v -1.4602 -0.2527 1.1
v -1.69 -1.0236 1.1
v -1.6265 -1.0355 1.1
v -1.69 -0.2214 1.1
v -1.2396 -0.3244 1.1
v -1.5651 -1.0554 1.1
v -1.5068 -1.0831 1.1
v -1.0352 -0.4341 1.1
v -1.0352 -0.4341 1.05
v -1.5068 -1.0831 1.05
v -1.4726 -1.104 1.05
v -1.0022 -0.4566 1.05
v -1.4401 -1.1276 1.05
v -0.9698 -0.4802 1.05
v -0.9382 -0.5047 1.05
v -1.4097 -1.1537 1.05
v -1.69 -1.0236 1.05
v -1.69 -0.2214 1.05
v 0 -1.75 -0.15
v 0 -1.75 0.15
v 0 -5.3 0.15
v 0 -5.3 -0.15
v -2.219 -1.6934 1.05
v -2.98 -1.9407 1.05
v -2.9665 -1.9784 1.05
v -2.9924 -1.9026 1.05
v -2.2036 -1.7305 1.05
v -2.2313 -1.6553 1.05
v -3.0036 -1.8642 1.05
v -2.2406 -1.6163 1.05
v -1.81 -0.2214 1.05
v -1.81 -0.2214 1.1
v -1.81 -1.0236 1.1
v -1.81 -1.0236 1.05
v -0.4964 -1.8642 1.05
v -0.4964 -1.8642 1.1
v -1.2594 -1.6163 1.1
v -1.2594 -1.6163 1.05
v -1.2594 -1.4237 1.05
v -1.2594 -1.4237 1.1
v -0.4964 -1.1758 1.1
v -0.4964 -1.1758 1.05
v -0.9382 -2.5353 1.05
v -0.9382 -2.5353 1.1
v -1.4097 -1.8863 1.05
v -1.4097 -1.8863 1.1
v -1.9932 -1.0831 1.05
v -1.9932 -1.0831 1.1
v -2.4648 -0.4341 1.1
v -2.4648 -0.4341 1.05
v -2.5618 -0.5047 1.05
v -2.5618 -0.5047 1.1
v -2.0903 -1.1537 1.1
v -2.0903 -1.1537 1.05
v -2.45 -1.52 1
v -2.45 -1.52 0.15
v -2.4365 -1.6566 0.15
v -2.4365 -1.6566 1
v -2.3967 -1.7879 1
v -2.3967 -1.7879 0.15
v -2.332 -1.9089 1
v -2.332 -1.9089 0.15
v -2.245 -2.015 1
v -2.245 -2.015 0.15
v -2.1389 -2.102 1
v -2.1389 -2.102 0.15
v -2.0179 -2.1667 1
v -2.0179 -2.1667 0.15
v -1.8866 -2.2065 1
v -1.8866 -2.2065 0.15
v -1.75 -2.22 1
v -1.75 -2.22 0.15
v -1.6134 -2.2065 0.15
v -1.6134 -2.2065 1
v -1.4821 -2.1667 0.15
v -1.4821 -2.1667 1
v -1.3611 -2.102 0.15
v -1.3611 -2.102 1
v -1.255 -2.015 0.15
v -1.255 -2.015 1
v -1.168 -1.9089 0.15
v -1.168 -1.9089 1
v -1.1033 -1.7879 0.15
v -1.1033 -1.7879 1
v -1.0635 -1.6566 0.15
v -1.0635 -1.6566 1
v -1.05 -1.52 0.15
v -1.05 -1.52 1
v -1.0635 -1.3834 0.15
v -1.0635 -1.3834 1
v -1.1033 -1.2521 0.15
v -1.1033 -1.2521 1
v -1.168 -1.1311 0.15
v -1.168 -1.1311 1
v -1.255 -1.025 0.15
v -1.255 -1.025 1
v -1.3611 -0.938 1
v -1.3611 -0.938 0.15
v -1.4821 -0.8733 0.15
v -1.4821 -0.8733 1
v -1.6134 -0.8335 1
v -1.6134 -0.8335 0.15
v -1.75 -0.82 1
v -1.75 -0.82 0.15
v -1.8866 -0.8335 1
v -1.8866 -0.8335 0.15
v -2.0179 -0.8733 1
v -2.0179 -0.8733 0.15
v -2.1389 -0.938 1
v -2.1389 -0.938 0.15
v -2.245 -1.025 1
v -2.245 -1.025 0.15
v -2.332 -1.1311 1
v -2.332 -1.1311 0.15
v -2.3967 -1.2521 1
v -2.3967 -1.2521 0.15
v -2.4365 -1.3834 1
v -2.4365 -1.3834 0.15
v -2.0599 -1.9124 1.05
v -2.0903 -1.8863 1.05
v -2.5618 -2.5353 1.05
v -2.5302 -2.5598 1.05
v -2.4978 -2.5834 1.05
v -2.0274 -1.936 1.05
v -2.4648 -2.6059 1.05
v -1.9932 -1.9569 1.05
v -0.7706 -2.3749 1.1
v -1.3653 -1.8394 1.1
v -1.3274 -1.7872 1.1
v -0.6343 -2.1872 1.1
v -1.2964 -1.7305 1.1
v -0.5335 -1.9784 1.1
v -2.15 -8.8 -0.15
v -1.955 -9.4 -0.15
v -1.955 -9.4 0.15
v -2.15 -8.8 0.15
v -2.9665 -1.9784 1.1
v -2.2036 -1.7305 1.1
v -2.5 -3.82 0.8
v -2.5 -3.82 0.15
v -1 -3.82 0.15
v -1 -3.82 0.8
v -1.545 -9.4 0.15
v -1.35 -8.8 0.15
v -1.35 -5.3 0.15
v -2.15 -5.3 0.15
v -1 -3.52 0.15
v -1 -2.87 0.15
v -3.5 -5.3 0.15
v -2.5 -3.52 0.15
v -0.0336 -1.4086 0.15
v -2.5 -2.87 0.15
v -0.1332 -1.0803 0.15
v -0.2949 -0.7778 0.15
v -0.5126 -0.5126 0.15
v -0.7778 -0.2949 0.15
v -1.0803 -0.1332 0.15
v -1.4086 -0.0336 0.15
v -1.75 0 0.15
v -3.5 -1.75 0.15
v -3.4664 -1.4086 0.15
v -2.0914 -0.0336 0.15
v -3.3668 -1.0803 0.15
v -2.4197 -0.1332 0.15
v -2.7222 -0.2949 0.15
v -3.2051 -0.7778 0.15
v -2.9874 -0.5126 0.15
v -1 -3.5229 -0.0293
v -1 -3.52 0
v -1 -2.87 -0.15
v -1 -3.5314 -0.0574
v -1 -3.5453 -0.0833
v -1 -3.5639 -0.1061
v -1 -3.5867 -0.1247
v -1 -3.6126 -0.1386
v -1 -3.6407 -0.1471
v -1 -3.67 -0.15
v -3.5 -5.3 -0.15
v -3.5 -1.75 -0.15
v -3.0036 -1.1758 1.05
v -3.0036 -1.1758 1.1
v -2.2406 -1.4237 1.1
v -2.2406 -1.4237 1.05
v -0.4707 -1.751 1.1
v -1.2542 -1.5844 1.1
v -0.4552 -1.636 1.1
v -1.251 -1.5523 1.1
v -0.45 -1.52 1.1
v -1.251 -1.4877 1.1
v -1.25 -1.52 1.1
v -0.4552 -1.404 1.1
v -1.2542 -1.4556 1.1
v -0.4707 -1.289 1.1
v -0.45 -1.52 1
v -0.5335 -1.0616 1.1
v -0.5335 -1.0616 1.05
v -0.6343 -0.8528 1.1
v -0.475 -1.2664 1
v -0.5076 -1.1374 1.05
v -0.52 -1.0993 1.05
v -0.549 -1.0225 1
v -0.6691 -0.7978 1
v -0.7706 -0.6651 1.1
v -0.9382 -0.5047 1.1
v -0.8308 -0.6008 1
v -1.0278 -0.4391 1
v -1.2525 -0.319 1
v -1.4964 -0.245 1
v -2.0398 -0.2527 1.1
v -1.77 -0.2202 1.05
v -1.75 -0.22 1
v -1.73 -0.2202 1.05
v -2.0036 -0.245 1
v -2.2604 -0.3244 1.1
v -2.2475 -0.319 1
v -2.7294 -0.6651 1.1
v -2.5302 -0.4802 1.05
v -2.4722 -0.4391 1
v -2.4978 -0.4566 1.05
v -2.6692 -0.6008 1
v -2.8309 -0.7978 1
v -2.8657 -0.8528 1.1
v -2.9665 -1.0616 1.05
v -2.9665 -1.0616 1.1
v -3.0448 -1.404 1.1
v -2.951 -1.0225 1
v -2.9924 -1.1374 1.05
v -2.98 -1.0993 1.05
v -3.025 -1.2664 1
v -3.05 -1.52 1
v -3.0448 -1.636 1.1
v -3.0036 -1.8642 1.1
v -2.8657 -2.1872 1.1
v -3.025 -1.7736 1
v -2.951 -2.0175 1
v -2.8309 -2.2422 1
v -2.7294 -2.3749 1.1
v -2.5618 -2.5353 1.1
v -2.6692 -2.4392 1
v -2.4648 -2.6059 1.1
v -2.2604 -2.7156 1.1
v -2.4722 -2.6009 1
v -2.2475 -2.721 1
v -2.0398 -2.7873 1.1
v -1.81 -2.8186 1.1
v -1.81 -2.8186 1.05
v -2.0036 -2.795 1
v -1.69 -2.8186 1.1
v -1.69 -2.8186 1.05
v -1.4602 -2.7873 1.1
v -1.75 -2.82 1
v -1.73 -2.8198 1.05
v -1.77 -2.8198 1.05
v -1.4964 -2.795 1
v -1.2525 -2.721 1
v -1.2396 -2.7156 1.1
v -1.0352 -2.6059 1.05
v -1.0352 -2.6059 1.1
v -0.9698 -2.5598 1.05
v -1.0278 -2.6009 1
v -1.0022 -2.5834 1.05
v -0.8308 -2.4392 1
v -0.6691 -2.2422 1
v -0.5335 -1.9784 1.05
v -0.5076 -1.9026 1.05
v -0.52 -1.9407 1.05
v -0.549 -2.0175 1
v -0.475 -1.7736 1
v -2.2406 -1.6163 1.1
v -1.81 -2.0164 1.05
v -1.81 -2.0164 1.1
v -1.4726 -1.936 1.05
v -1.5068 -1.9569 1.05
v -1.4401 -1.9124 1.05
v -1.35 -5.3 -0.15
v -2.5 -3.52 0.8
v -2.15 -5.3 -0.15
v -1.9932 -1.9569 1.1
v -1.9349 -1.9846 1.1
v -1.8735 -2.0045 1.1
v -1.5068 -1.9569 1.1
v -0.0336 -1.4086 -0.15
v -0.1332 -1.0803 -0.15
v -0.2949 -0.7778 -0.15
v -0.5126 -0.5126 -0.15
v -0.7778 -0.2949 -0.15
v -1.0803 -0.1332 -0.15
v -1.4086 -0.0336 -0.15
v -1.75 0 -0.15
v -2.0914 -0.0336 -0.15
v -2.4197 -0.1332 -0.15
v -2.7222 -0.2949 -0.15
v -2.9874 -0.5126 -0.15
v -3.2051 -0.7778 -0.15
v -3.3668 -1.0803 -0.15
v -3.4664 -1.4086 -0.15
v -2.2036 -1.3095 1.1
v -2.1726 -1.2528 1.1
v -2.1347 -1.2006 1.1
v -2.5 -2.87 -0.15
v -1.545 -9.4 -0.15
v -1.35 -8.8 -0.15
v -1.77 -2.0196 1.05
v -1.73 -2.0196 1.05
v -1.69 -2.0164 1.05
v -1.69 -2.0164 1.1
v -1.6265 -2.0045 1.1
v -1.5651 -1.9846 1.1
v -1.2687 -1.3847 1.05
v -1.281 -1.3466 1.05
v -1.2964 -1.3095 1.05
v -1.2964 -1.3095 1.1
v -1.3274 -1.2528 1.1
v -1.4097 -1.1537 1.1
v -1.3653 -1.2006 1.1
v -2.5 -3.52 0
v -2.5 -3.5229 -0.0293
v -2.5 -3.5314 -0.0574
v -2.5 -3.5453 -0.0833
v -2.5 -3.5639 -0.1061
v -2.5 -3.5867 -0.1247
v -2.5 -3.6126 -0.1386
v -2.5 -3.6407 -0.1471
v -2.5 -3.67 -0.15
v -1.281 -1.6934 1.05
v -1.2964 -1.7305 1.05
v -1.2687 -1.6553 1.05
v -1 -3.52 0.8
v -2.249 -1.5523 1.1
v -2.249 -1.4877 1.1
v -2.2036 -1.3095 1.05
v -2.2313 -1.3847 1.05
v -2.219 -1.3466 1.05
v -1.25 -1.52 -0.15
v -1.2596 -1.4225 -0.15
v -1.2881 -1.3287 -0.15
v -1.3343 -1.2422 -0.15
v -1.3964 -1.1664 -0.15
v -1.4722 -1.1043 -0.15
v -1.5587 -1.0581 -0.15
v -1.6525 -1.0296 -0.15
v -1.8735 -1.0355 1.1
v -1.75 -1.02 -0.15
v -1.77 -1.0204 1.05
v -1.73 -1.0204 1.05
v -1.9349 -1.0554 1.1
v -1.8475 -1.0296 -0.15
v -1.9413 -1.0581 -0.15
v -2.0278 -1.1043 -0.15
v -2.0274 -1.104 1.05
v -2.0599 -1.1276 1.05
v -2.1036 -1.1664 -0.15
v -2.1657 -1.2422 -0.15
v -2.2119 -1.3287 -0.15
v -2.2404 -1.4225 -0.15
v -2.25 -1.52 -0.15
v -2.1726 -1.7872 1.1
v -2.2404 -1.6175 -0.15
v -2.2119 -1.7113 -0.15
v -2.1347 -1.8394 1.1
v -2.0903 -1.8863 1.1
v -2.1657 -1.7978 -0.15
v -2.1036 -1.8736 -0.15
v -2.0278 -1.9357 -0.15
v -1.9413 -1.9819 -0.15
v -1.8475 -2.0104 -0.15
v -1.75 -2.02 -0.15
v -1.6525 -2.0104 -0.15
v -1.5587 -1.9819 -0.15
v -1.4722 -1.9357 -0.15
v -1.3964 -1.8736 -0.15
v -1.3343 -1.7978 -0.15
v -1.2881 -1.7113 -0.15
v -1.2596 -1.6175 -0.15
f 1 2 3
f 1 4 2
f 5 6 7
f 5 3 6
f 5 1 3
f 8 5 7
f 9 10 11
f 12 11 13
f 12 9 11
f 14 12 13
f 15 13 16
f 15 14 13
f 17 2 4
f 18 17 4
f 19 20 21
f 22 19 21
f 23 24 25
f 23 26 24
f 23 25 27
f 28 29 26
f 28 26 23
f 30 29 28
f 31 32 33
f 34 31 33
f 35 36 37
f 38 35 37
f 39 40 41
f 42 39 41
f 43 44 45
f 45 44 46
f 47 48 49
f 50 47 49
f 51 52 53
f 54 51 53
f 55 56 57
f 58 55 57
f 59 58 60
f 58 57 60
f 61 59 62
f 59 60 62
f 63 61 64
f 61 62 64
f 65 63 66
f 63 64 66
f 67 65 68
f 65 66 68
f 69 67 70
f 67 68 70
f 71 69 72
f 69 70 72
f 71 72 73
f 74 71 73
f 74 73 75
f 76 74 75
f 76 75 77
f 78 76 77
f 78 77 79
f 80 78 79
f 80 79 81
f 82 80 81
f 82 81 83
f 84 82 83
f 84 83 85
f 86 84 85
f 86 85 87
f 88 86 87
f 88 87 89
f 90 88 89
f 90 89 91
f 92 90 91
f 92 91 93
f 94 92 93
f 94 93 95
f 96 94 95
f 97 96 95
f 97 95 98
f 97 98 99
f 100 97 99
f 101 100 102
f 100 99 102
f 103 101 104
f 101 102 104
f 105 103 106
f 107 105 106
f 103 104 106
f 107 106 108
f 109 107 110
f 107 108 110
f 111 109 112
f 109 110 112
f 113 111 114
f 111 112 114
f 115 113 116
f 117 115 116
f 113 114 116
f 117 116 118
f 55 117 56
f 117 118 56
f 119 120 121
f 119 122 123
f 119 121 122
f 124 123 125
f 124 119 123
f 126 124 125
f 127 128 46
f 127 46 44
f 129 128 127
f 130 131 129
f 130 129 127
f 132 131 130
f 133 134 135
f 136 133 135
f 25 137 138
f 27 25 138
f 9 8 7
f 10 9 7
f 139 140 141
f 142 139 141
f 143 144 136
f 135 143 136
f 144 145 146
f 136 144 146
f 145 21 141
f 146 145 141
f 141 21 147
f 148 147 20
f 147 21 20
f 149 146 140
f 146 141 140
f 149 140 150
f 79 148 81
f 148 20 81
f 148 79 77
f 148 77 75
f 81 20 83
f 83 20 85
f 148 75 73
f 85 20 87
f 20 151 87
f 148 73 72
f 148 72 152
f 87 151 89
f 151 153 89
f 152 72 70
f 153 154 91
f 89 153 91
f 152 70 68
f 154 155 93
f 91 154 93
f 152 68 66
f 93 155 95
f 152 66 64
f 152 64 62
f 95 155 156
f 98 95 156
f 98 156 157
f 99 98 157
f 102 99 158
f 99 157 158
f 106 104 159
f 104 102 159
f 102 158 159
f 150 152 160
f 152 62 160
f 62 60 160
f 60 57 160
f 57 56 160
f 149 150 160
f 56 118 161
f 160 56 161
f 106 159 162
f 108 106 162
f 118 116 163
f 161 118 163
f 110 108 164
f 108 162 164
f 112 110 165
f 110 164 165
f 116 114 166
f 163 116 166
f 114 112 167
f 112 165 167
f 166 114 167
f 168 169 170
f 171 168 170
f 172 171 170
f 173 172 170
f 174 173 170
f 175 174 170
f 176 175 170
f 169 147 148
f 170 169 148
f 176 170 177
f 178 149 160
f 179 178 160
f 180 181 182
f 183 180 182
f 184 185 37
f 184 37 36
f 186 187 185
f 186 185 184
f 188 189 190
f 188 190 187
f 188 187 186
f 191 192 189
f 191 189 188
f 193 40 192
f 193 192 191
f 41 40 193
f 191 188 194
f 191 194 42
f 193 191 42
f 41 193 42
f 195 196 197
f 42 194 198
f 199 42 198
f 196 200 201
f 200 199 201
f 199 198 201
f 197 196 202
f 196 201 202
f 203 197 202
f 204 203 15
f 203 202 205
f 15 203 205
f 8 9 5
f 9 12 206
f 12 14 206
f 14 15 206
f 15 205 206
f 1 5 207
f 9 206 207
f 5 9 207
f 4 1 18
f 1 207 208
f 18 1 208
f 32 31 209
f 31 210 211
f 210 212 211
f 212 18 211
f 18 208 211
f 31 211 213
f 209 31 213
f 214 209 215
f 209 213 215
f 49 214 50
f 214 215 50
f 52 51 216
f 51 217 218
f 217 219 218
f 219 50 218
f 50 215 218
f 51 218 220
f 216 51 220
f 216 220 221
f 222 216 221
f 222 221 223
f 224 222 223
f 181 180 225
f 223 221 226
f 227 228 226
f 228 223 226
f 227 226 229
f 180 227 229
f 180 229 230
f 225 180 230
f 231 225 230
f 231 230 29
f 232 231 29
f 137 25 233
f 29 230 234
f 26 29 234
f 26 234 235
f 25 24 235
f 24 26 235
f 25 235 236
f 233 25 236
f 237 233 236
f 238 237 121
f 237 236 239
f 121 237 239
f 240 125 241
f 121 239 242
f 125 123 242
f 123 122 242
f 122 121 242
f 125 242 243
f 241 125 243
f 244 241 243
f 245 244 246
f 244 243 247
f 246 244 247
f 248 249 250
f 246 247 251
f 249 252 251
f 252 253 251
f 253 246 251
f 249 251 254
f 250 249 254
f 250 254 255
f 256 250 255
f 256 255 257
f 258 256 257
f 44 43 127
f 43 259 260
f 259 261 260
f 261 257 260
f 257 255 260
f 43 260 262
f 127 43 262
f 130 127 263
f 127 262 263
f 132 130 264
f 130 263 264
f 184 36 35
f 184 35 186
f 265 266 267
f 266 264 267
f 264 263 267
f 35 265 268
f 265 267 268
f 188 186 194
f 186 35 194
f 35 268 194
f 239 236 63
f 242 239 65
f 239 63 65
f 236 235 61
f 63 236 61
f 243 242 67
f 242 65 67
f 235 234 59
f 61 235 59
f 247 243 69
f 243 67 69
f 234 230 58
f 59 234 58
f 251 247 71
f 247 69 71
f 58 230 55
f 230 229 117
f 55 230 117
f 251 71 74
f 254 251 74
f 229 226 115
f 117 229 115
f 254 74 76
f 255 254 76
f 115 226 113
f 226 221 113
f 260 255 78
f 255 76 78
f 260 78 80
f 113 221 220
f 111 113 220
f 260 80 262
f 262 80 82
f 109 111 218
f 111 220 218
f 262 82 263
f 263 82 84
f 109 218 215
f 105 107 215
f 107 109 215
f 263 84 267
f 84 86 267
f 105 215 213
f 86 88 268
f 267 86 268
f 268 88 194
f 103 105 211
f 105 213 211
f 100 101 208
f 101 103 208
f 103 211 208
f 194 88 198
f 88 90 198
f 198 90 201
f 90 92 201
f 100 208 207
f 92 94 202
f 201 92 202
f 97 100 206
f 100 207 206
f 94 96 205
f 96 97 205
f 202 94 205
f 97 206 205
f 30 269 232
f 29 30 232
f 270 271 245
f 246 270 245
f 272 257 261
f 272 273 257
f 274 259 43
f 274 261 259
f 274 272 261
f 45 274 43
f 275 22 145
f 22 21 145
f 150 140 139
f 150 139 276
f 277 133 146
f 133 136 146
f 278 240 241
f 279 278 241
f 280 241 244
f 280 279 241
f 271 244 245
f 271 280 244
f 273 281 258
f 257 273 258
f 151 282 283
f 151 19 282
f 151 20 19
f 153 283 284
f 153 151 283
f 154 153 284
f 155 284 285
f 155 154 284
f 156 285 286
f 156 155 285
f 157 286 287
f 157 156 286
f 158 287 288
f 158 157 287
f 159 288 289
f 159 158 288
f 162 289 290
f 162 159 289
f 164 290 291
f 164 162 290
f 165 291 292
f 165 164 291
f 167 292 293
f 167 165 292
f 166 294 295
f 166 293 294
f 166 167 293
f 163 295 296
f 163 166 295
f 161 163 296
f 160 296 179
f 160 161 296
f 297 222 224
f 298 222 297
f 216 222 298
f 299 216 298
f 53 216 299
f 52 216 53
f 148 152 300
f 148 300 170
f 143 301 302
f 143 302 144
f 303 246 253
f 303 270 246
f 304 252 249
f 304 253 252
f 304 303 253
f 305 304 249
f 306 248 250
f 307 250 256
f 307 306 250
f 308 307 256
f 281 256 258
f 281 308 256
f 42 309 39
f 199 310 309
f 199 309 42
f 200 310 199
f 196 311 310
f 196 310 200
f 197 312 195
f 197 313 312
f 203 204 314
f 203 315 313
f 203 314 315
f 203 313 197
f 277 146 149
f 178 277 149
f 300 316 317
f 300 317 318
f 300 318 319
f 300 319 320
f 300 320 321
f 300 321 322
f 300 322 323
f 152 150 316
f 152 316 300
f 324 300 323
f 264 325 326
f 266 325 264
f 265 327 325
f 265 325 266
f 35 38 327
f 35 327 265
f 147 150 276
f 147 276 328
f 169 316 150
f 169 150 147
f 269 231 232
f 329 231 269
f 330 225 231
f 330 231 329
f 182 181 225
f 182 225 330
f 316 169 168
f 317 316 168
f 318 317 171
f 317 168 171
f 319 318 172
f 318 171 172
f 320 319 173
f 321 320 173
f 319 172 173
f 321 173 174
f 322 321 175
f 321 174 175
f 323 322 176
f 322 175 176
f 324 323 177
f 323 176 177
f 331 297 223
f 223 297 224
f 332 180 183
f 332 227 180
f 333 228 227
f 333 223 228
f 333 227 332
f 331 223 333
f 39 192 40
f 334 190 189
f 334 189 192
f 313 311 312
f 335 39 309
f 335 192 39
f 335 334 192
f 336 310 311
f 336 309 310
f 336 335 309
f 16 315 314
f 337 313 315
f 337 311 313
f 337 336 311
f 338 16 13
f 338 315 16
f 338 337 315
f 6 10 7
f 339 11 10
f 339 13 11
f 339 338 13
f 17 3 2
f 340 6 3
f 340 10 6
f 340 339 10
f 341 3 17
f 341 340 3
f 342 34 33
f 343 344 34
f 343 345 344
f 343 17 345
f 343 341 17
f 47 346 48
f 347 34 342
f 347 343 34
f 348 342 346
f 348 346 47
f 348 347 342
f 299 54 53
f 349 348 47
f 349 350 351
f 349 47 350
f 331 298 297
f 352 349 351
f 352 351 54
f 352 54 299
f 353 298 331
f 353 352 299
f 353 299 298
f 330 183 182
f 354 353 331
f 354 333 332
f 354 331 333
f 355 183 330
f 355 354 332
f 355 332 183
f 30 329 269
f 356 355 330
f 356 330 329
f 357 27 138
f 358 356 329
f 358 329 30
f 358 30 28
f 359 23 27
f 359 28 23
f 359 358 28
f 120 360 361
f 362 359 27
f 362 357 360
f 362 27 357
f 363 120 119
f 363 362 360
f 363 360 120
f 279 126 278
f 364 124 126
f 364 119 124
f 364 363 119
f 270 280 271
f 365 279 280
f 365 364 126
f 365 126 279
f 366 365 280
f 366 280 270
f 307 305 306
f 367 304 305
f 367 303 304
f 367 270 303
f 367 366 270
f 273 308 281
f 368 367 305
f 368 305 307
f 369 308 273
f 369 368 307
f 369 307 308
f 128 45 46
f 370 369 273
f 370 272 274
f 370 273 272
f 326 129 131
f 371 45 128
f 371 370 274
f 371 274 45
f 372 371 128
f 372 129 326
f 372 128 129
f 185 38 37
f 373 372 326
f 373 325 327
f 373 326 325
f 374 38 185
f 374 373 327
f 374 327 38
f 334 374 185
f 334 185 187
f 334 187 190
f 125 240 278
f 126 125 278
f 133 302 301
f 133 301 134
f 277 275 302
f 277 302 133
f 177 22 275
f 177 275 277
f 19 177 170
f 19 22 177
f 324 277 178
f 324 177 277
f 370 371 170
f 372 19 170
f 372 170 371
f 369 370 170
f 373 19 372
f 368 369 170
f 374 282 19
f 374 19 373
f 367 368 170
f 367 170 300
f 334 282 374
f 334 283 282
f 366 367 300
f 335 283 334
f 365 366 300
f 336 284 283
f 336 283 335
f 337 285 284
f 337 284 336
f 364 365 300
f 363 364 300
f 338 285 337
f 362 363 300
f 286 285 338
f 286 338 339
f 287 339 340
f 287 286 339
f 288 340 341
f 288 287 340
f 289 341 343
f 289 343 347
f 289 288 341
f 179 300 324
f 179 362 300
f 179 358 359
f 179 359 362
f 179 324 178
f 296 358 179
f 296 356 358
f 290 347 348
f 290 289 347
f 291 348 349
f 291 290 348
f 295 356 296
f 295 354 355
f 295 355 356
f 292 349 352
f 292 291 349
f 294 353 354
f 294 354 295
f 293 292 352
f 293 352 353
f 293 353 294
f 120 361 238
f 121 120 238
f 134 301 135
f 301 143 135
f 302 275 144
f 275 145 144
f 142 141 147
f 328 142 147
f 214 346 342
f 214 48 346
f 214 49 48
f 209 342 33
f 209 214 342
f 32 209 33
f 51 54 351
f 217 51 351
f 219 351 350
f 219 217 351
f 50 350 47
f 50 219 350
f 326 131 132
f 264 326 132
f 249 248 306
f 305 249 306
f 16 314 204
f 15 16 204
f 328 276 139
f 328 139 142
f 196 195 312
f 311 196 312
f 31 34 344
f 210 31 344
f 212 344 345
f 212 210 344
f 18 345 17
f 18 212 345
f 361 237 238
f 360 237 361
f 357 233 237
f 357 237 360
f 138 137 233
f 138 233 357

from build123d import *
from OCP.BRepFilletAPI import BRepFilletAPI_MakeChamfer

# Parameters (mm, degrees)
SKETCH1_R           = 0.5
SKETCH1_W           = 1.5
SKETCH1_H           = 0.8
BOSS_EXTRUDE1_DEPTH = 0.15
FILLET1_RADIUS      = 1.75
FILLET1_LENGTH      = 0.3
CHAMFER1_SIZE       = 0.6
CHAMFER1_SIZE2      = 0.194951818
SKETCH2_W           = 1.5
SKETCH2_H           = 0.3
BOSS_EXTRUDE2_DEPTH = 0.8
BOSS_EXTRUDE3_START = -1
BOSS_EXTRUDE3_DEPTH = 1.5
SKETCH4_R           = 0.7
SKETCH4_R_2         = 0.5
BOSS_EXTRUDE4_DEPTH = 1
BOSS_EXTRUDE5_START = 1
SKETCH5_R           = 1.3
SKETCH5_R_2         = 0.5
BOSS_EXTRUDE5_DEPTH = 0.1
CUT_EXTRUDE1_START  = 1.1
CUT_EXTRUDE1_DEPTH  = 0.05


with BuildPart() as part:
    # Sketch1 → Boss-Extrude1 (new, symmetric)
    with BuildSketch(Plane.XY):
        Polygon((-2.15, -5.3), (-3.5, -5.3), (-3.5, 0), (0, 0), (0, -5.3), (-1.35, -5.3), (-1.35, -9.4), (-2.15, -9.4), align=None)
        with Locations((-1.75, -1.52)):
            Circle(SKETCH1_R, mode=Mode.SUBTRACT)
        with Locations((-1.75, -3.27)):
            Rectangle(SKETCH1_W, SKETCH1_H, mode=Mode.SUBTRACT)
    extrude(amount=BOSS_EXTRUDE1_DEPTH, both=True)

    # Fillet1: full round fillet: the end face becomes a half cylinder, R = half its width
    fillet1_face = Plane((-1.75, 0, 0), x_dir=(0, 0, 1), z_dir=(0, 1, 0))  # on the end face: x along it, z out of the body
    fillet1_slab = fillet1_face.offset(-FILLET1_RADIUS / 2) * Box(FILLET1_LENGTH, 2 * FILLET1_RADIUS, FILLET1_RADIUS, mode=Mode.PRIVATE)  # the body's end, R deep
    fillet1_round = Plane((-1.75, -1.75, 0), x_dir=(0, 1, 0), z_dir=(0, 0, 1)) * Cylinder(FILLET1_RADIUS, FILLET1_LENGTH, mode=Mode.PRIVATE)  # its axis R under the face
    add(fillet1_slab - fillet1_round, mode=Mode.SUBTRACT)

    # Chamfer1: one chamfer whose edges measure the first distance from different faces: ONE call of the kernel's chamfer builder (chamfer() names one face for all edges)
    chamfer1_edges_1 = [part.edges().sort_by_distance(p)[0] for p in [
        (-1.35, -9.4, 0),
    ]]
    chamfer1_side_1 = [part.faces().sort_by_distance(p)[0] for p in [
        (-1.35, -7.35, 0),
    ]]
    chamfer1_edges_2 = [part.edges().sort_by_distance(p)[0] for p in [
        (-2.15, -9.4, 0),
    ]]
    chamfer1_side_2 = [part.faces().sort_by_distance(p)[0] for p in [
        (-2.15, -7.35, 0),
    ]]
    chamfer1 = BRepFilletAPI_MakeChamfer(part.part.solid().wrapped)
    for e in chamfer1_edges_1:
        chamfer1.Add(CHAMFER1_SIZE, CHAMFER1_SIZE2, e.wrapped, chamfer1_side_1[0].wrapped)  # the first distance lies on this face
    for e in chamfer1_edges_2:
        chamfer1.Add(CHAMFER1_SIZE, CHAMFER1_SIZE2, e.wrapped, chamfer1_side_2[0].wrapped)  # the first distance lies on this face
    add(Compound.cast(chamfer1.Shape()), mode=Mode.REPLACE)

    # Sketch2 → Boss-Extrude2 (add)
    with BuildSketch(Plane.XY):
        with Locations((-1.75, -3.67)):
            Rectangle(SKETCH2_W, SKETCH2_H)
    extrude(amount=BOSS_EXTRUDE2_DEPTH)

    # Sketch3 → Boss-Extrude3 (add)
    with BuildSketch(Plane(origin=(0, 0, 0), x_dir=(0, 0, -1), z_dir=(1, 0, 0)).offset(BOSS_EXTRUDE3_START)):
        with BuildLine():
            Line((0.15, -3.67), (0, -3.67))
            Line((0, -3.67), (0, -3.52))
            ThreePointArc((0, -3.52), (0.106066017, -3.563933983), (0.15, -3.67))
        make_face()
    extrude(amount=-BOSS_EXTRUDE3_DEPTH)

    # Sketch4 → Boss-Extrude4 (add)
    with BuildSketch(Plane.XY):
        with Locations(Location((-1.75, -1.52, 0), (0, 0, 180))):
            Circle(SKETCH4_R)
        with Locations((-1.75, -1.52)):
            Circle(SKETCH4_R_2, mode=Mode.SUBTRACT)
    extrude(amount=BOSS_EXTRUDE4_DEPTH)

    # Sketch5 → Boss-Extrude5 (add)
    with BuildSketch(Plane.XY.offset(BOSS_EXTRUDE5_START)):
        with Locations((-1.75, -1.52)):
            Circle(SKETCH5_R)
        with Locations((-1.75, -1.52)):
            Circle(SKETCH5_R_2, mode=Mode.SUBTRACT)
    extrude(amount=BOSS_EXTRUDE5_DEPTH)

    # Sketch6 → Cut-Extrude1 (cut)
    with BuildSketch(Plane.XY.offset(CUT_EXTRUDE1_START)):
        Polygon((-1.75, -1.417921903), (-1.69, -1.335338988), (-1.69, -0.22), (-1.81, -0.22), (-1.81, -1.335338988), align=None)
        Polygon((-1.81, -1.437417085), (-1.81, -1.335338988), (-2.465579808, -0.433010792), (-2.562661848, -0.503545022), (-1.907082039, -1.405873218), align=None)
        Polygon((-1.944164079, -1.52), (-1.847082039, -1.488456133), (-1.907082039, -1.405873218), (-2.967832452, -1.061214516), (-3.004914491, -1.175341298), align=None)
        Polygon((-2.967832452, -1.978785484), (-1.907082039, -1.634126782), (-1.847082039, -1.551543867), (-1.944164079, -1.52), (-3.004914491, -1.864658702), align=None)
        Polygon((-1.69, -1.437417085), (-1.592917961, -1.405873218), (-0.937338152, -0.503545022), (-1.034420192, -0.433010792), (-1.69, -1.335338988), align=None)
        Polygon((-1.555835921, -1.52), (-0.495085509, -1.175341298), (-0.532167548, -1.061214516), (-1.592917961, -1.405873218), (-1.652917961, -1.488456133), align=None)
        Polygon((-0.495085509, -1.864658702), (-1.555835921, -1.52), (-1.652917961, -1.551543867), (-1.592917961, -1.634126782), (-0.532167548, -1.978785484), align=None)
        Polygon((-1.81, -1.704661012), (-1.81, -1.602582915), (-1.907082039, -1.634126782), (-2.562661848, -2.536454978), (-2.465579808, -2.606989208), align=None)
        Polygon((-0.937338152, -2.536454978), (-1.592917961, -1.634126782), (-1.69, -1.602582915), (-1.69, -1.704661012), (-1.034420192, -2.606989208), align=None)
        Polygon((-1.69, -2.82), (-1.69, -1.704661012), (-1.75, -1.622078097), (-1.81, -1.704661012), (-1.81, -2.82), align=None)
    extrude(amount=-CUT_EXTRUDE1_DEPTH, mode=Mode.SUBTRACT)


solid = part.part
